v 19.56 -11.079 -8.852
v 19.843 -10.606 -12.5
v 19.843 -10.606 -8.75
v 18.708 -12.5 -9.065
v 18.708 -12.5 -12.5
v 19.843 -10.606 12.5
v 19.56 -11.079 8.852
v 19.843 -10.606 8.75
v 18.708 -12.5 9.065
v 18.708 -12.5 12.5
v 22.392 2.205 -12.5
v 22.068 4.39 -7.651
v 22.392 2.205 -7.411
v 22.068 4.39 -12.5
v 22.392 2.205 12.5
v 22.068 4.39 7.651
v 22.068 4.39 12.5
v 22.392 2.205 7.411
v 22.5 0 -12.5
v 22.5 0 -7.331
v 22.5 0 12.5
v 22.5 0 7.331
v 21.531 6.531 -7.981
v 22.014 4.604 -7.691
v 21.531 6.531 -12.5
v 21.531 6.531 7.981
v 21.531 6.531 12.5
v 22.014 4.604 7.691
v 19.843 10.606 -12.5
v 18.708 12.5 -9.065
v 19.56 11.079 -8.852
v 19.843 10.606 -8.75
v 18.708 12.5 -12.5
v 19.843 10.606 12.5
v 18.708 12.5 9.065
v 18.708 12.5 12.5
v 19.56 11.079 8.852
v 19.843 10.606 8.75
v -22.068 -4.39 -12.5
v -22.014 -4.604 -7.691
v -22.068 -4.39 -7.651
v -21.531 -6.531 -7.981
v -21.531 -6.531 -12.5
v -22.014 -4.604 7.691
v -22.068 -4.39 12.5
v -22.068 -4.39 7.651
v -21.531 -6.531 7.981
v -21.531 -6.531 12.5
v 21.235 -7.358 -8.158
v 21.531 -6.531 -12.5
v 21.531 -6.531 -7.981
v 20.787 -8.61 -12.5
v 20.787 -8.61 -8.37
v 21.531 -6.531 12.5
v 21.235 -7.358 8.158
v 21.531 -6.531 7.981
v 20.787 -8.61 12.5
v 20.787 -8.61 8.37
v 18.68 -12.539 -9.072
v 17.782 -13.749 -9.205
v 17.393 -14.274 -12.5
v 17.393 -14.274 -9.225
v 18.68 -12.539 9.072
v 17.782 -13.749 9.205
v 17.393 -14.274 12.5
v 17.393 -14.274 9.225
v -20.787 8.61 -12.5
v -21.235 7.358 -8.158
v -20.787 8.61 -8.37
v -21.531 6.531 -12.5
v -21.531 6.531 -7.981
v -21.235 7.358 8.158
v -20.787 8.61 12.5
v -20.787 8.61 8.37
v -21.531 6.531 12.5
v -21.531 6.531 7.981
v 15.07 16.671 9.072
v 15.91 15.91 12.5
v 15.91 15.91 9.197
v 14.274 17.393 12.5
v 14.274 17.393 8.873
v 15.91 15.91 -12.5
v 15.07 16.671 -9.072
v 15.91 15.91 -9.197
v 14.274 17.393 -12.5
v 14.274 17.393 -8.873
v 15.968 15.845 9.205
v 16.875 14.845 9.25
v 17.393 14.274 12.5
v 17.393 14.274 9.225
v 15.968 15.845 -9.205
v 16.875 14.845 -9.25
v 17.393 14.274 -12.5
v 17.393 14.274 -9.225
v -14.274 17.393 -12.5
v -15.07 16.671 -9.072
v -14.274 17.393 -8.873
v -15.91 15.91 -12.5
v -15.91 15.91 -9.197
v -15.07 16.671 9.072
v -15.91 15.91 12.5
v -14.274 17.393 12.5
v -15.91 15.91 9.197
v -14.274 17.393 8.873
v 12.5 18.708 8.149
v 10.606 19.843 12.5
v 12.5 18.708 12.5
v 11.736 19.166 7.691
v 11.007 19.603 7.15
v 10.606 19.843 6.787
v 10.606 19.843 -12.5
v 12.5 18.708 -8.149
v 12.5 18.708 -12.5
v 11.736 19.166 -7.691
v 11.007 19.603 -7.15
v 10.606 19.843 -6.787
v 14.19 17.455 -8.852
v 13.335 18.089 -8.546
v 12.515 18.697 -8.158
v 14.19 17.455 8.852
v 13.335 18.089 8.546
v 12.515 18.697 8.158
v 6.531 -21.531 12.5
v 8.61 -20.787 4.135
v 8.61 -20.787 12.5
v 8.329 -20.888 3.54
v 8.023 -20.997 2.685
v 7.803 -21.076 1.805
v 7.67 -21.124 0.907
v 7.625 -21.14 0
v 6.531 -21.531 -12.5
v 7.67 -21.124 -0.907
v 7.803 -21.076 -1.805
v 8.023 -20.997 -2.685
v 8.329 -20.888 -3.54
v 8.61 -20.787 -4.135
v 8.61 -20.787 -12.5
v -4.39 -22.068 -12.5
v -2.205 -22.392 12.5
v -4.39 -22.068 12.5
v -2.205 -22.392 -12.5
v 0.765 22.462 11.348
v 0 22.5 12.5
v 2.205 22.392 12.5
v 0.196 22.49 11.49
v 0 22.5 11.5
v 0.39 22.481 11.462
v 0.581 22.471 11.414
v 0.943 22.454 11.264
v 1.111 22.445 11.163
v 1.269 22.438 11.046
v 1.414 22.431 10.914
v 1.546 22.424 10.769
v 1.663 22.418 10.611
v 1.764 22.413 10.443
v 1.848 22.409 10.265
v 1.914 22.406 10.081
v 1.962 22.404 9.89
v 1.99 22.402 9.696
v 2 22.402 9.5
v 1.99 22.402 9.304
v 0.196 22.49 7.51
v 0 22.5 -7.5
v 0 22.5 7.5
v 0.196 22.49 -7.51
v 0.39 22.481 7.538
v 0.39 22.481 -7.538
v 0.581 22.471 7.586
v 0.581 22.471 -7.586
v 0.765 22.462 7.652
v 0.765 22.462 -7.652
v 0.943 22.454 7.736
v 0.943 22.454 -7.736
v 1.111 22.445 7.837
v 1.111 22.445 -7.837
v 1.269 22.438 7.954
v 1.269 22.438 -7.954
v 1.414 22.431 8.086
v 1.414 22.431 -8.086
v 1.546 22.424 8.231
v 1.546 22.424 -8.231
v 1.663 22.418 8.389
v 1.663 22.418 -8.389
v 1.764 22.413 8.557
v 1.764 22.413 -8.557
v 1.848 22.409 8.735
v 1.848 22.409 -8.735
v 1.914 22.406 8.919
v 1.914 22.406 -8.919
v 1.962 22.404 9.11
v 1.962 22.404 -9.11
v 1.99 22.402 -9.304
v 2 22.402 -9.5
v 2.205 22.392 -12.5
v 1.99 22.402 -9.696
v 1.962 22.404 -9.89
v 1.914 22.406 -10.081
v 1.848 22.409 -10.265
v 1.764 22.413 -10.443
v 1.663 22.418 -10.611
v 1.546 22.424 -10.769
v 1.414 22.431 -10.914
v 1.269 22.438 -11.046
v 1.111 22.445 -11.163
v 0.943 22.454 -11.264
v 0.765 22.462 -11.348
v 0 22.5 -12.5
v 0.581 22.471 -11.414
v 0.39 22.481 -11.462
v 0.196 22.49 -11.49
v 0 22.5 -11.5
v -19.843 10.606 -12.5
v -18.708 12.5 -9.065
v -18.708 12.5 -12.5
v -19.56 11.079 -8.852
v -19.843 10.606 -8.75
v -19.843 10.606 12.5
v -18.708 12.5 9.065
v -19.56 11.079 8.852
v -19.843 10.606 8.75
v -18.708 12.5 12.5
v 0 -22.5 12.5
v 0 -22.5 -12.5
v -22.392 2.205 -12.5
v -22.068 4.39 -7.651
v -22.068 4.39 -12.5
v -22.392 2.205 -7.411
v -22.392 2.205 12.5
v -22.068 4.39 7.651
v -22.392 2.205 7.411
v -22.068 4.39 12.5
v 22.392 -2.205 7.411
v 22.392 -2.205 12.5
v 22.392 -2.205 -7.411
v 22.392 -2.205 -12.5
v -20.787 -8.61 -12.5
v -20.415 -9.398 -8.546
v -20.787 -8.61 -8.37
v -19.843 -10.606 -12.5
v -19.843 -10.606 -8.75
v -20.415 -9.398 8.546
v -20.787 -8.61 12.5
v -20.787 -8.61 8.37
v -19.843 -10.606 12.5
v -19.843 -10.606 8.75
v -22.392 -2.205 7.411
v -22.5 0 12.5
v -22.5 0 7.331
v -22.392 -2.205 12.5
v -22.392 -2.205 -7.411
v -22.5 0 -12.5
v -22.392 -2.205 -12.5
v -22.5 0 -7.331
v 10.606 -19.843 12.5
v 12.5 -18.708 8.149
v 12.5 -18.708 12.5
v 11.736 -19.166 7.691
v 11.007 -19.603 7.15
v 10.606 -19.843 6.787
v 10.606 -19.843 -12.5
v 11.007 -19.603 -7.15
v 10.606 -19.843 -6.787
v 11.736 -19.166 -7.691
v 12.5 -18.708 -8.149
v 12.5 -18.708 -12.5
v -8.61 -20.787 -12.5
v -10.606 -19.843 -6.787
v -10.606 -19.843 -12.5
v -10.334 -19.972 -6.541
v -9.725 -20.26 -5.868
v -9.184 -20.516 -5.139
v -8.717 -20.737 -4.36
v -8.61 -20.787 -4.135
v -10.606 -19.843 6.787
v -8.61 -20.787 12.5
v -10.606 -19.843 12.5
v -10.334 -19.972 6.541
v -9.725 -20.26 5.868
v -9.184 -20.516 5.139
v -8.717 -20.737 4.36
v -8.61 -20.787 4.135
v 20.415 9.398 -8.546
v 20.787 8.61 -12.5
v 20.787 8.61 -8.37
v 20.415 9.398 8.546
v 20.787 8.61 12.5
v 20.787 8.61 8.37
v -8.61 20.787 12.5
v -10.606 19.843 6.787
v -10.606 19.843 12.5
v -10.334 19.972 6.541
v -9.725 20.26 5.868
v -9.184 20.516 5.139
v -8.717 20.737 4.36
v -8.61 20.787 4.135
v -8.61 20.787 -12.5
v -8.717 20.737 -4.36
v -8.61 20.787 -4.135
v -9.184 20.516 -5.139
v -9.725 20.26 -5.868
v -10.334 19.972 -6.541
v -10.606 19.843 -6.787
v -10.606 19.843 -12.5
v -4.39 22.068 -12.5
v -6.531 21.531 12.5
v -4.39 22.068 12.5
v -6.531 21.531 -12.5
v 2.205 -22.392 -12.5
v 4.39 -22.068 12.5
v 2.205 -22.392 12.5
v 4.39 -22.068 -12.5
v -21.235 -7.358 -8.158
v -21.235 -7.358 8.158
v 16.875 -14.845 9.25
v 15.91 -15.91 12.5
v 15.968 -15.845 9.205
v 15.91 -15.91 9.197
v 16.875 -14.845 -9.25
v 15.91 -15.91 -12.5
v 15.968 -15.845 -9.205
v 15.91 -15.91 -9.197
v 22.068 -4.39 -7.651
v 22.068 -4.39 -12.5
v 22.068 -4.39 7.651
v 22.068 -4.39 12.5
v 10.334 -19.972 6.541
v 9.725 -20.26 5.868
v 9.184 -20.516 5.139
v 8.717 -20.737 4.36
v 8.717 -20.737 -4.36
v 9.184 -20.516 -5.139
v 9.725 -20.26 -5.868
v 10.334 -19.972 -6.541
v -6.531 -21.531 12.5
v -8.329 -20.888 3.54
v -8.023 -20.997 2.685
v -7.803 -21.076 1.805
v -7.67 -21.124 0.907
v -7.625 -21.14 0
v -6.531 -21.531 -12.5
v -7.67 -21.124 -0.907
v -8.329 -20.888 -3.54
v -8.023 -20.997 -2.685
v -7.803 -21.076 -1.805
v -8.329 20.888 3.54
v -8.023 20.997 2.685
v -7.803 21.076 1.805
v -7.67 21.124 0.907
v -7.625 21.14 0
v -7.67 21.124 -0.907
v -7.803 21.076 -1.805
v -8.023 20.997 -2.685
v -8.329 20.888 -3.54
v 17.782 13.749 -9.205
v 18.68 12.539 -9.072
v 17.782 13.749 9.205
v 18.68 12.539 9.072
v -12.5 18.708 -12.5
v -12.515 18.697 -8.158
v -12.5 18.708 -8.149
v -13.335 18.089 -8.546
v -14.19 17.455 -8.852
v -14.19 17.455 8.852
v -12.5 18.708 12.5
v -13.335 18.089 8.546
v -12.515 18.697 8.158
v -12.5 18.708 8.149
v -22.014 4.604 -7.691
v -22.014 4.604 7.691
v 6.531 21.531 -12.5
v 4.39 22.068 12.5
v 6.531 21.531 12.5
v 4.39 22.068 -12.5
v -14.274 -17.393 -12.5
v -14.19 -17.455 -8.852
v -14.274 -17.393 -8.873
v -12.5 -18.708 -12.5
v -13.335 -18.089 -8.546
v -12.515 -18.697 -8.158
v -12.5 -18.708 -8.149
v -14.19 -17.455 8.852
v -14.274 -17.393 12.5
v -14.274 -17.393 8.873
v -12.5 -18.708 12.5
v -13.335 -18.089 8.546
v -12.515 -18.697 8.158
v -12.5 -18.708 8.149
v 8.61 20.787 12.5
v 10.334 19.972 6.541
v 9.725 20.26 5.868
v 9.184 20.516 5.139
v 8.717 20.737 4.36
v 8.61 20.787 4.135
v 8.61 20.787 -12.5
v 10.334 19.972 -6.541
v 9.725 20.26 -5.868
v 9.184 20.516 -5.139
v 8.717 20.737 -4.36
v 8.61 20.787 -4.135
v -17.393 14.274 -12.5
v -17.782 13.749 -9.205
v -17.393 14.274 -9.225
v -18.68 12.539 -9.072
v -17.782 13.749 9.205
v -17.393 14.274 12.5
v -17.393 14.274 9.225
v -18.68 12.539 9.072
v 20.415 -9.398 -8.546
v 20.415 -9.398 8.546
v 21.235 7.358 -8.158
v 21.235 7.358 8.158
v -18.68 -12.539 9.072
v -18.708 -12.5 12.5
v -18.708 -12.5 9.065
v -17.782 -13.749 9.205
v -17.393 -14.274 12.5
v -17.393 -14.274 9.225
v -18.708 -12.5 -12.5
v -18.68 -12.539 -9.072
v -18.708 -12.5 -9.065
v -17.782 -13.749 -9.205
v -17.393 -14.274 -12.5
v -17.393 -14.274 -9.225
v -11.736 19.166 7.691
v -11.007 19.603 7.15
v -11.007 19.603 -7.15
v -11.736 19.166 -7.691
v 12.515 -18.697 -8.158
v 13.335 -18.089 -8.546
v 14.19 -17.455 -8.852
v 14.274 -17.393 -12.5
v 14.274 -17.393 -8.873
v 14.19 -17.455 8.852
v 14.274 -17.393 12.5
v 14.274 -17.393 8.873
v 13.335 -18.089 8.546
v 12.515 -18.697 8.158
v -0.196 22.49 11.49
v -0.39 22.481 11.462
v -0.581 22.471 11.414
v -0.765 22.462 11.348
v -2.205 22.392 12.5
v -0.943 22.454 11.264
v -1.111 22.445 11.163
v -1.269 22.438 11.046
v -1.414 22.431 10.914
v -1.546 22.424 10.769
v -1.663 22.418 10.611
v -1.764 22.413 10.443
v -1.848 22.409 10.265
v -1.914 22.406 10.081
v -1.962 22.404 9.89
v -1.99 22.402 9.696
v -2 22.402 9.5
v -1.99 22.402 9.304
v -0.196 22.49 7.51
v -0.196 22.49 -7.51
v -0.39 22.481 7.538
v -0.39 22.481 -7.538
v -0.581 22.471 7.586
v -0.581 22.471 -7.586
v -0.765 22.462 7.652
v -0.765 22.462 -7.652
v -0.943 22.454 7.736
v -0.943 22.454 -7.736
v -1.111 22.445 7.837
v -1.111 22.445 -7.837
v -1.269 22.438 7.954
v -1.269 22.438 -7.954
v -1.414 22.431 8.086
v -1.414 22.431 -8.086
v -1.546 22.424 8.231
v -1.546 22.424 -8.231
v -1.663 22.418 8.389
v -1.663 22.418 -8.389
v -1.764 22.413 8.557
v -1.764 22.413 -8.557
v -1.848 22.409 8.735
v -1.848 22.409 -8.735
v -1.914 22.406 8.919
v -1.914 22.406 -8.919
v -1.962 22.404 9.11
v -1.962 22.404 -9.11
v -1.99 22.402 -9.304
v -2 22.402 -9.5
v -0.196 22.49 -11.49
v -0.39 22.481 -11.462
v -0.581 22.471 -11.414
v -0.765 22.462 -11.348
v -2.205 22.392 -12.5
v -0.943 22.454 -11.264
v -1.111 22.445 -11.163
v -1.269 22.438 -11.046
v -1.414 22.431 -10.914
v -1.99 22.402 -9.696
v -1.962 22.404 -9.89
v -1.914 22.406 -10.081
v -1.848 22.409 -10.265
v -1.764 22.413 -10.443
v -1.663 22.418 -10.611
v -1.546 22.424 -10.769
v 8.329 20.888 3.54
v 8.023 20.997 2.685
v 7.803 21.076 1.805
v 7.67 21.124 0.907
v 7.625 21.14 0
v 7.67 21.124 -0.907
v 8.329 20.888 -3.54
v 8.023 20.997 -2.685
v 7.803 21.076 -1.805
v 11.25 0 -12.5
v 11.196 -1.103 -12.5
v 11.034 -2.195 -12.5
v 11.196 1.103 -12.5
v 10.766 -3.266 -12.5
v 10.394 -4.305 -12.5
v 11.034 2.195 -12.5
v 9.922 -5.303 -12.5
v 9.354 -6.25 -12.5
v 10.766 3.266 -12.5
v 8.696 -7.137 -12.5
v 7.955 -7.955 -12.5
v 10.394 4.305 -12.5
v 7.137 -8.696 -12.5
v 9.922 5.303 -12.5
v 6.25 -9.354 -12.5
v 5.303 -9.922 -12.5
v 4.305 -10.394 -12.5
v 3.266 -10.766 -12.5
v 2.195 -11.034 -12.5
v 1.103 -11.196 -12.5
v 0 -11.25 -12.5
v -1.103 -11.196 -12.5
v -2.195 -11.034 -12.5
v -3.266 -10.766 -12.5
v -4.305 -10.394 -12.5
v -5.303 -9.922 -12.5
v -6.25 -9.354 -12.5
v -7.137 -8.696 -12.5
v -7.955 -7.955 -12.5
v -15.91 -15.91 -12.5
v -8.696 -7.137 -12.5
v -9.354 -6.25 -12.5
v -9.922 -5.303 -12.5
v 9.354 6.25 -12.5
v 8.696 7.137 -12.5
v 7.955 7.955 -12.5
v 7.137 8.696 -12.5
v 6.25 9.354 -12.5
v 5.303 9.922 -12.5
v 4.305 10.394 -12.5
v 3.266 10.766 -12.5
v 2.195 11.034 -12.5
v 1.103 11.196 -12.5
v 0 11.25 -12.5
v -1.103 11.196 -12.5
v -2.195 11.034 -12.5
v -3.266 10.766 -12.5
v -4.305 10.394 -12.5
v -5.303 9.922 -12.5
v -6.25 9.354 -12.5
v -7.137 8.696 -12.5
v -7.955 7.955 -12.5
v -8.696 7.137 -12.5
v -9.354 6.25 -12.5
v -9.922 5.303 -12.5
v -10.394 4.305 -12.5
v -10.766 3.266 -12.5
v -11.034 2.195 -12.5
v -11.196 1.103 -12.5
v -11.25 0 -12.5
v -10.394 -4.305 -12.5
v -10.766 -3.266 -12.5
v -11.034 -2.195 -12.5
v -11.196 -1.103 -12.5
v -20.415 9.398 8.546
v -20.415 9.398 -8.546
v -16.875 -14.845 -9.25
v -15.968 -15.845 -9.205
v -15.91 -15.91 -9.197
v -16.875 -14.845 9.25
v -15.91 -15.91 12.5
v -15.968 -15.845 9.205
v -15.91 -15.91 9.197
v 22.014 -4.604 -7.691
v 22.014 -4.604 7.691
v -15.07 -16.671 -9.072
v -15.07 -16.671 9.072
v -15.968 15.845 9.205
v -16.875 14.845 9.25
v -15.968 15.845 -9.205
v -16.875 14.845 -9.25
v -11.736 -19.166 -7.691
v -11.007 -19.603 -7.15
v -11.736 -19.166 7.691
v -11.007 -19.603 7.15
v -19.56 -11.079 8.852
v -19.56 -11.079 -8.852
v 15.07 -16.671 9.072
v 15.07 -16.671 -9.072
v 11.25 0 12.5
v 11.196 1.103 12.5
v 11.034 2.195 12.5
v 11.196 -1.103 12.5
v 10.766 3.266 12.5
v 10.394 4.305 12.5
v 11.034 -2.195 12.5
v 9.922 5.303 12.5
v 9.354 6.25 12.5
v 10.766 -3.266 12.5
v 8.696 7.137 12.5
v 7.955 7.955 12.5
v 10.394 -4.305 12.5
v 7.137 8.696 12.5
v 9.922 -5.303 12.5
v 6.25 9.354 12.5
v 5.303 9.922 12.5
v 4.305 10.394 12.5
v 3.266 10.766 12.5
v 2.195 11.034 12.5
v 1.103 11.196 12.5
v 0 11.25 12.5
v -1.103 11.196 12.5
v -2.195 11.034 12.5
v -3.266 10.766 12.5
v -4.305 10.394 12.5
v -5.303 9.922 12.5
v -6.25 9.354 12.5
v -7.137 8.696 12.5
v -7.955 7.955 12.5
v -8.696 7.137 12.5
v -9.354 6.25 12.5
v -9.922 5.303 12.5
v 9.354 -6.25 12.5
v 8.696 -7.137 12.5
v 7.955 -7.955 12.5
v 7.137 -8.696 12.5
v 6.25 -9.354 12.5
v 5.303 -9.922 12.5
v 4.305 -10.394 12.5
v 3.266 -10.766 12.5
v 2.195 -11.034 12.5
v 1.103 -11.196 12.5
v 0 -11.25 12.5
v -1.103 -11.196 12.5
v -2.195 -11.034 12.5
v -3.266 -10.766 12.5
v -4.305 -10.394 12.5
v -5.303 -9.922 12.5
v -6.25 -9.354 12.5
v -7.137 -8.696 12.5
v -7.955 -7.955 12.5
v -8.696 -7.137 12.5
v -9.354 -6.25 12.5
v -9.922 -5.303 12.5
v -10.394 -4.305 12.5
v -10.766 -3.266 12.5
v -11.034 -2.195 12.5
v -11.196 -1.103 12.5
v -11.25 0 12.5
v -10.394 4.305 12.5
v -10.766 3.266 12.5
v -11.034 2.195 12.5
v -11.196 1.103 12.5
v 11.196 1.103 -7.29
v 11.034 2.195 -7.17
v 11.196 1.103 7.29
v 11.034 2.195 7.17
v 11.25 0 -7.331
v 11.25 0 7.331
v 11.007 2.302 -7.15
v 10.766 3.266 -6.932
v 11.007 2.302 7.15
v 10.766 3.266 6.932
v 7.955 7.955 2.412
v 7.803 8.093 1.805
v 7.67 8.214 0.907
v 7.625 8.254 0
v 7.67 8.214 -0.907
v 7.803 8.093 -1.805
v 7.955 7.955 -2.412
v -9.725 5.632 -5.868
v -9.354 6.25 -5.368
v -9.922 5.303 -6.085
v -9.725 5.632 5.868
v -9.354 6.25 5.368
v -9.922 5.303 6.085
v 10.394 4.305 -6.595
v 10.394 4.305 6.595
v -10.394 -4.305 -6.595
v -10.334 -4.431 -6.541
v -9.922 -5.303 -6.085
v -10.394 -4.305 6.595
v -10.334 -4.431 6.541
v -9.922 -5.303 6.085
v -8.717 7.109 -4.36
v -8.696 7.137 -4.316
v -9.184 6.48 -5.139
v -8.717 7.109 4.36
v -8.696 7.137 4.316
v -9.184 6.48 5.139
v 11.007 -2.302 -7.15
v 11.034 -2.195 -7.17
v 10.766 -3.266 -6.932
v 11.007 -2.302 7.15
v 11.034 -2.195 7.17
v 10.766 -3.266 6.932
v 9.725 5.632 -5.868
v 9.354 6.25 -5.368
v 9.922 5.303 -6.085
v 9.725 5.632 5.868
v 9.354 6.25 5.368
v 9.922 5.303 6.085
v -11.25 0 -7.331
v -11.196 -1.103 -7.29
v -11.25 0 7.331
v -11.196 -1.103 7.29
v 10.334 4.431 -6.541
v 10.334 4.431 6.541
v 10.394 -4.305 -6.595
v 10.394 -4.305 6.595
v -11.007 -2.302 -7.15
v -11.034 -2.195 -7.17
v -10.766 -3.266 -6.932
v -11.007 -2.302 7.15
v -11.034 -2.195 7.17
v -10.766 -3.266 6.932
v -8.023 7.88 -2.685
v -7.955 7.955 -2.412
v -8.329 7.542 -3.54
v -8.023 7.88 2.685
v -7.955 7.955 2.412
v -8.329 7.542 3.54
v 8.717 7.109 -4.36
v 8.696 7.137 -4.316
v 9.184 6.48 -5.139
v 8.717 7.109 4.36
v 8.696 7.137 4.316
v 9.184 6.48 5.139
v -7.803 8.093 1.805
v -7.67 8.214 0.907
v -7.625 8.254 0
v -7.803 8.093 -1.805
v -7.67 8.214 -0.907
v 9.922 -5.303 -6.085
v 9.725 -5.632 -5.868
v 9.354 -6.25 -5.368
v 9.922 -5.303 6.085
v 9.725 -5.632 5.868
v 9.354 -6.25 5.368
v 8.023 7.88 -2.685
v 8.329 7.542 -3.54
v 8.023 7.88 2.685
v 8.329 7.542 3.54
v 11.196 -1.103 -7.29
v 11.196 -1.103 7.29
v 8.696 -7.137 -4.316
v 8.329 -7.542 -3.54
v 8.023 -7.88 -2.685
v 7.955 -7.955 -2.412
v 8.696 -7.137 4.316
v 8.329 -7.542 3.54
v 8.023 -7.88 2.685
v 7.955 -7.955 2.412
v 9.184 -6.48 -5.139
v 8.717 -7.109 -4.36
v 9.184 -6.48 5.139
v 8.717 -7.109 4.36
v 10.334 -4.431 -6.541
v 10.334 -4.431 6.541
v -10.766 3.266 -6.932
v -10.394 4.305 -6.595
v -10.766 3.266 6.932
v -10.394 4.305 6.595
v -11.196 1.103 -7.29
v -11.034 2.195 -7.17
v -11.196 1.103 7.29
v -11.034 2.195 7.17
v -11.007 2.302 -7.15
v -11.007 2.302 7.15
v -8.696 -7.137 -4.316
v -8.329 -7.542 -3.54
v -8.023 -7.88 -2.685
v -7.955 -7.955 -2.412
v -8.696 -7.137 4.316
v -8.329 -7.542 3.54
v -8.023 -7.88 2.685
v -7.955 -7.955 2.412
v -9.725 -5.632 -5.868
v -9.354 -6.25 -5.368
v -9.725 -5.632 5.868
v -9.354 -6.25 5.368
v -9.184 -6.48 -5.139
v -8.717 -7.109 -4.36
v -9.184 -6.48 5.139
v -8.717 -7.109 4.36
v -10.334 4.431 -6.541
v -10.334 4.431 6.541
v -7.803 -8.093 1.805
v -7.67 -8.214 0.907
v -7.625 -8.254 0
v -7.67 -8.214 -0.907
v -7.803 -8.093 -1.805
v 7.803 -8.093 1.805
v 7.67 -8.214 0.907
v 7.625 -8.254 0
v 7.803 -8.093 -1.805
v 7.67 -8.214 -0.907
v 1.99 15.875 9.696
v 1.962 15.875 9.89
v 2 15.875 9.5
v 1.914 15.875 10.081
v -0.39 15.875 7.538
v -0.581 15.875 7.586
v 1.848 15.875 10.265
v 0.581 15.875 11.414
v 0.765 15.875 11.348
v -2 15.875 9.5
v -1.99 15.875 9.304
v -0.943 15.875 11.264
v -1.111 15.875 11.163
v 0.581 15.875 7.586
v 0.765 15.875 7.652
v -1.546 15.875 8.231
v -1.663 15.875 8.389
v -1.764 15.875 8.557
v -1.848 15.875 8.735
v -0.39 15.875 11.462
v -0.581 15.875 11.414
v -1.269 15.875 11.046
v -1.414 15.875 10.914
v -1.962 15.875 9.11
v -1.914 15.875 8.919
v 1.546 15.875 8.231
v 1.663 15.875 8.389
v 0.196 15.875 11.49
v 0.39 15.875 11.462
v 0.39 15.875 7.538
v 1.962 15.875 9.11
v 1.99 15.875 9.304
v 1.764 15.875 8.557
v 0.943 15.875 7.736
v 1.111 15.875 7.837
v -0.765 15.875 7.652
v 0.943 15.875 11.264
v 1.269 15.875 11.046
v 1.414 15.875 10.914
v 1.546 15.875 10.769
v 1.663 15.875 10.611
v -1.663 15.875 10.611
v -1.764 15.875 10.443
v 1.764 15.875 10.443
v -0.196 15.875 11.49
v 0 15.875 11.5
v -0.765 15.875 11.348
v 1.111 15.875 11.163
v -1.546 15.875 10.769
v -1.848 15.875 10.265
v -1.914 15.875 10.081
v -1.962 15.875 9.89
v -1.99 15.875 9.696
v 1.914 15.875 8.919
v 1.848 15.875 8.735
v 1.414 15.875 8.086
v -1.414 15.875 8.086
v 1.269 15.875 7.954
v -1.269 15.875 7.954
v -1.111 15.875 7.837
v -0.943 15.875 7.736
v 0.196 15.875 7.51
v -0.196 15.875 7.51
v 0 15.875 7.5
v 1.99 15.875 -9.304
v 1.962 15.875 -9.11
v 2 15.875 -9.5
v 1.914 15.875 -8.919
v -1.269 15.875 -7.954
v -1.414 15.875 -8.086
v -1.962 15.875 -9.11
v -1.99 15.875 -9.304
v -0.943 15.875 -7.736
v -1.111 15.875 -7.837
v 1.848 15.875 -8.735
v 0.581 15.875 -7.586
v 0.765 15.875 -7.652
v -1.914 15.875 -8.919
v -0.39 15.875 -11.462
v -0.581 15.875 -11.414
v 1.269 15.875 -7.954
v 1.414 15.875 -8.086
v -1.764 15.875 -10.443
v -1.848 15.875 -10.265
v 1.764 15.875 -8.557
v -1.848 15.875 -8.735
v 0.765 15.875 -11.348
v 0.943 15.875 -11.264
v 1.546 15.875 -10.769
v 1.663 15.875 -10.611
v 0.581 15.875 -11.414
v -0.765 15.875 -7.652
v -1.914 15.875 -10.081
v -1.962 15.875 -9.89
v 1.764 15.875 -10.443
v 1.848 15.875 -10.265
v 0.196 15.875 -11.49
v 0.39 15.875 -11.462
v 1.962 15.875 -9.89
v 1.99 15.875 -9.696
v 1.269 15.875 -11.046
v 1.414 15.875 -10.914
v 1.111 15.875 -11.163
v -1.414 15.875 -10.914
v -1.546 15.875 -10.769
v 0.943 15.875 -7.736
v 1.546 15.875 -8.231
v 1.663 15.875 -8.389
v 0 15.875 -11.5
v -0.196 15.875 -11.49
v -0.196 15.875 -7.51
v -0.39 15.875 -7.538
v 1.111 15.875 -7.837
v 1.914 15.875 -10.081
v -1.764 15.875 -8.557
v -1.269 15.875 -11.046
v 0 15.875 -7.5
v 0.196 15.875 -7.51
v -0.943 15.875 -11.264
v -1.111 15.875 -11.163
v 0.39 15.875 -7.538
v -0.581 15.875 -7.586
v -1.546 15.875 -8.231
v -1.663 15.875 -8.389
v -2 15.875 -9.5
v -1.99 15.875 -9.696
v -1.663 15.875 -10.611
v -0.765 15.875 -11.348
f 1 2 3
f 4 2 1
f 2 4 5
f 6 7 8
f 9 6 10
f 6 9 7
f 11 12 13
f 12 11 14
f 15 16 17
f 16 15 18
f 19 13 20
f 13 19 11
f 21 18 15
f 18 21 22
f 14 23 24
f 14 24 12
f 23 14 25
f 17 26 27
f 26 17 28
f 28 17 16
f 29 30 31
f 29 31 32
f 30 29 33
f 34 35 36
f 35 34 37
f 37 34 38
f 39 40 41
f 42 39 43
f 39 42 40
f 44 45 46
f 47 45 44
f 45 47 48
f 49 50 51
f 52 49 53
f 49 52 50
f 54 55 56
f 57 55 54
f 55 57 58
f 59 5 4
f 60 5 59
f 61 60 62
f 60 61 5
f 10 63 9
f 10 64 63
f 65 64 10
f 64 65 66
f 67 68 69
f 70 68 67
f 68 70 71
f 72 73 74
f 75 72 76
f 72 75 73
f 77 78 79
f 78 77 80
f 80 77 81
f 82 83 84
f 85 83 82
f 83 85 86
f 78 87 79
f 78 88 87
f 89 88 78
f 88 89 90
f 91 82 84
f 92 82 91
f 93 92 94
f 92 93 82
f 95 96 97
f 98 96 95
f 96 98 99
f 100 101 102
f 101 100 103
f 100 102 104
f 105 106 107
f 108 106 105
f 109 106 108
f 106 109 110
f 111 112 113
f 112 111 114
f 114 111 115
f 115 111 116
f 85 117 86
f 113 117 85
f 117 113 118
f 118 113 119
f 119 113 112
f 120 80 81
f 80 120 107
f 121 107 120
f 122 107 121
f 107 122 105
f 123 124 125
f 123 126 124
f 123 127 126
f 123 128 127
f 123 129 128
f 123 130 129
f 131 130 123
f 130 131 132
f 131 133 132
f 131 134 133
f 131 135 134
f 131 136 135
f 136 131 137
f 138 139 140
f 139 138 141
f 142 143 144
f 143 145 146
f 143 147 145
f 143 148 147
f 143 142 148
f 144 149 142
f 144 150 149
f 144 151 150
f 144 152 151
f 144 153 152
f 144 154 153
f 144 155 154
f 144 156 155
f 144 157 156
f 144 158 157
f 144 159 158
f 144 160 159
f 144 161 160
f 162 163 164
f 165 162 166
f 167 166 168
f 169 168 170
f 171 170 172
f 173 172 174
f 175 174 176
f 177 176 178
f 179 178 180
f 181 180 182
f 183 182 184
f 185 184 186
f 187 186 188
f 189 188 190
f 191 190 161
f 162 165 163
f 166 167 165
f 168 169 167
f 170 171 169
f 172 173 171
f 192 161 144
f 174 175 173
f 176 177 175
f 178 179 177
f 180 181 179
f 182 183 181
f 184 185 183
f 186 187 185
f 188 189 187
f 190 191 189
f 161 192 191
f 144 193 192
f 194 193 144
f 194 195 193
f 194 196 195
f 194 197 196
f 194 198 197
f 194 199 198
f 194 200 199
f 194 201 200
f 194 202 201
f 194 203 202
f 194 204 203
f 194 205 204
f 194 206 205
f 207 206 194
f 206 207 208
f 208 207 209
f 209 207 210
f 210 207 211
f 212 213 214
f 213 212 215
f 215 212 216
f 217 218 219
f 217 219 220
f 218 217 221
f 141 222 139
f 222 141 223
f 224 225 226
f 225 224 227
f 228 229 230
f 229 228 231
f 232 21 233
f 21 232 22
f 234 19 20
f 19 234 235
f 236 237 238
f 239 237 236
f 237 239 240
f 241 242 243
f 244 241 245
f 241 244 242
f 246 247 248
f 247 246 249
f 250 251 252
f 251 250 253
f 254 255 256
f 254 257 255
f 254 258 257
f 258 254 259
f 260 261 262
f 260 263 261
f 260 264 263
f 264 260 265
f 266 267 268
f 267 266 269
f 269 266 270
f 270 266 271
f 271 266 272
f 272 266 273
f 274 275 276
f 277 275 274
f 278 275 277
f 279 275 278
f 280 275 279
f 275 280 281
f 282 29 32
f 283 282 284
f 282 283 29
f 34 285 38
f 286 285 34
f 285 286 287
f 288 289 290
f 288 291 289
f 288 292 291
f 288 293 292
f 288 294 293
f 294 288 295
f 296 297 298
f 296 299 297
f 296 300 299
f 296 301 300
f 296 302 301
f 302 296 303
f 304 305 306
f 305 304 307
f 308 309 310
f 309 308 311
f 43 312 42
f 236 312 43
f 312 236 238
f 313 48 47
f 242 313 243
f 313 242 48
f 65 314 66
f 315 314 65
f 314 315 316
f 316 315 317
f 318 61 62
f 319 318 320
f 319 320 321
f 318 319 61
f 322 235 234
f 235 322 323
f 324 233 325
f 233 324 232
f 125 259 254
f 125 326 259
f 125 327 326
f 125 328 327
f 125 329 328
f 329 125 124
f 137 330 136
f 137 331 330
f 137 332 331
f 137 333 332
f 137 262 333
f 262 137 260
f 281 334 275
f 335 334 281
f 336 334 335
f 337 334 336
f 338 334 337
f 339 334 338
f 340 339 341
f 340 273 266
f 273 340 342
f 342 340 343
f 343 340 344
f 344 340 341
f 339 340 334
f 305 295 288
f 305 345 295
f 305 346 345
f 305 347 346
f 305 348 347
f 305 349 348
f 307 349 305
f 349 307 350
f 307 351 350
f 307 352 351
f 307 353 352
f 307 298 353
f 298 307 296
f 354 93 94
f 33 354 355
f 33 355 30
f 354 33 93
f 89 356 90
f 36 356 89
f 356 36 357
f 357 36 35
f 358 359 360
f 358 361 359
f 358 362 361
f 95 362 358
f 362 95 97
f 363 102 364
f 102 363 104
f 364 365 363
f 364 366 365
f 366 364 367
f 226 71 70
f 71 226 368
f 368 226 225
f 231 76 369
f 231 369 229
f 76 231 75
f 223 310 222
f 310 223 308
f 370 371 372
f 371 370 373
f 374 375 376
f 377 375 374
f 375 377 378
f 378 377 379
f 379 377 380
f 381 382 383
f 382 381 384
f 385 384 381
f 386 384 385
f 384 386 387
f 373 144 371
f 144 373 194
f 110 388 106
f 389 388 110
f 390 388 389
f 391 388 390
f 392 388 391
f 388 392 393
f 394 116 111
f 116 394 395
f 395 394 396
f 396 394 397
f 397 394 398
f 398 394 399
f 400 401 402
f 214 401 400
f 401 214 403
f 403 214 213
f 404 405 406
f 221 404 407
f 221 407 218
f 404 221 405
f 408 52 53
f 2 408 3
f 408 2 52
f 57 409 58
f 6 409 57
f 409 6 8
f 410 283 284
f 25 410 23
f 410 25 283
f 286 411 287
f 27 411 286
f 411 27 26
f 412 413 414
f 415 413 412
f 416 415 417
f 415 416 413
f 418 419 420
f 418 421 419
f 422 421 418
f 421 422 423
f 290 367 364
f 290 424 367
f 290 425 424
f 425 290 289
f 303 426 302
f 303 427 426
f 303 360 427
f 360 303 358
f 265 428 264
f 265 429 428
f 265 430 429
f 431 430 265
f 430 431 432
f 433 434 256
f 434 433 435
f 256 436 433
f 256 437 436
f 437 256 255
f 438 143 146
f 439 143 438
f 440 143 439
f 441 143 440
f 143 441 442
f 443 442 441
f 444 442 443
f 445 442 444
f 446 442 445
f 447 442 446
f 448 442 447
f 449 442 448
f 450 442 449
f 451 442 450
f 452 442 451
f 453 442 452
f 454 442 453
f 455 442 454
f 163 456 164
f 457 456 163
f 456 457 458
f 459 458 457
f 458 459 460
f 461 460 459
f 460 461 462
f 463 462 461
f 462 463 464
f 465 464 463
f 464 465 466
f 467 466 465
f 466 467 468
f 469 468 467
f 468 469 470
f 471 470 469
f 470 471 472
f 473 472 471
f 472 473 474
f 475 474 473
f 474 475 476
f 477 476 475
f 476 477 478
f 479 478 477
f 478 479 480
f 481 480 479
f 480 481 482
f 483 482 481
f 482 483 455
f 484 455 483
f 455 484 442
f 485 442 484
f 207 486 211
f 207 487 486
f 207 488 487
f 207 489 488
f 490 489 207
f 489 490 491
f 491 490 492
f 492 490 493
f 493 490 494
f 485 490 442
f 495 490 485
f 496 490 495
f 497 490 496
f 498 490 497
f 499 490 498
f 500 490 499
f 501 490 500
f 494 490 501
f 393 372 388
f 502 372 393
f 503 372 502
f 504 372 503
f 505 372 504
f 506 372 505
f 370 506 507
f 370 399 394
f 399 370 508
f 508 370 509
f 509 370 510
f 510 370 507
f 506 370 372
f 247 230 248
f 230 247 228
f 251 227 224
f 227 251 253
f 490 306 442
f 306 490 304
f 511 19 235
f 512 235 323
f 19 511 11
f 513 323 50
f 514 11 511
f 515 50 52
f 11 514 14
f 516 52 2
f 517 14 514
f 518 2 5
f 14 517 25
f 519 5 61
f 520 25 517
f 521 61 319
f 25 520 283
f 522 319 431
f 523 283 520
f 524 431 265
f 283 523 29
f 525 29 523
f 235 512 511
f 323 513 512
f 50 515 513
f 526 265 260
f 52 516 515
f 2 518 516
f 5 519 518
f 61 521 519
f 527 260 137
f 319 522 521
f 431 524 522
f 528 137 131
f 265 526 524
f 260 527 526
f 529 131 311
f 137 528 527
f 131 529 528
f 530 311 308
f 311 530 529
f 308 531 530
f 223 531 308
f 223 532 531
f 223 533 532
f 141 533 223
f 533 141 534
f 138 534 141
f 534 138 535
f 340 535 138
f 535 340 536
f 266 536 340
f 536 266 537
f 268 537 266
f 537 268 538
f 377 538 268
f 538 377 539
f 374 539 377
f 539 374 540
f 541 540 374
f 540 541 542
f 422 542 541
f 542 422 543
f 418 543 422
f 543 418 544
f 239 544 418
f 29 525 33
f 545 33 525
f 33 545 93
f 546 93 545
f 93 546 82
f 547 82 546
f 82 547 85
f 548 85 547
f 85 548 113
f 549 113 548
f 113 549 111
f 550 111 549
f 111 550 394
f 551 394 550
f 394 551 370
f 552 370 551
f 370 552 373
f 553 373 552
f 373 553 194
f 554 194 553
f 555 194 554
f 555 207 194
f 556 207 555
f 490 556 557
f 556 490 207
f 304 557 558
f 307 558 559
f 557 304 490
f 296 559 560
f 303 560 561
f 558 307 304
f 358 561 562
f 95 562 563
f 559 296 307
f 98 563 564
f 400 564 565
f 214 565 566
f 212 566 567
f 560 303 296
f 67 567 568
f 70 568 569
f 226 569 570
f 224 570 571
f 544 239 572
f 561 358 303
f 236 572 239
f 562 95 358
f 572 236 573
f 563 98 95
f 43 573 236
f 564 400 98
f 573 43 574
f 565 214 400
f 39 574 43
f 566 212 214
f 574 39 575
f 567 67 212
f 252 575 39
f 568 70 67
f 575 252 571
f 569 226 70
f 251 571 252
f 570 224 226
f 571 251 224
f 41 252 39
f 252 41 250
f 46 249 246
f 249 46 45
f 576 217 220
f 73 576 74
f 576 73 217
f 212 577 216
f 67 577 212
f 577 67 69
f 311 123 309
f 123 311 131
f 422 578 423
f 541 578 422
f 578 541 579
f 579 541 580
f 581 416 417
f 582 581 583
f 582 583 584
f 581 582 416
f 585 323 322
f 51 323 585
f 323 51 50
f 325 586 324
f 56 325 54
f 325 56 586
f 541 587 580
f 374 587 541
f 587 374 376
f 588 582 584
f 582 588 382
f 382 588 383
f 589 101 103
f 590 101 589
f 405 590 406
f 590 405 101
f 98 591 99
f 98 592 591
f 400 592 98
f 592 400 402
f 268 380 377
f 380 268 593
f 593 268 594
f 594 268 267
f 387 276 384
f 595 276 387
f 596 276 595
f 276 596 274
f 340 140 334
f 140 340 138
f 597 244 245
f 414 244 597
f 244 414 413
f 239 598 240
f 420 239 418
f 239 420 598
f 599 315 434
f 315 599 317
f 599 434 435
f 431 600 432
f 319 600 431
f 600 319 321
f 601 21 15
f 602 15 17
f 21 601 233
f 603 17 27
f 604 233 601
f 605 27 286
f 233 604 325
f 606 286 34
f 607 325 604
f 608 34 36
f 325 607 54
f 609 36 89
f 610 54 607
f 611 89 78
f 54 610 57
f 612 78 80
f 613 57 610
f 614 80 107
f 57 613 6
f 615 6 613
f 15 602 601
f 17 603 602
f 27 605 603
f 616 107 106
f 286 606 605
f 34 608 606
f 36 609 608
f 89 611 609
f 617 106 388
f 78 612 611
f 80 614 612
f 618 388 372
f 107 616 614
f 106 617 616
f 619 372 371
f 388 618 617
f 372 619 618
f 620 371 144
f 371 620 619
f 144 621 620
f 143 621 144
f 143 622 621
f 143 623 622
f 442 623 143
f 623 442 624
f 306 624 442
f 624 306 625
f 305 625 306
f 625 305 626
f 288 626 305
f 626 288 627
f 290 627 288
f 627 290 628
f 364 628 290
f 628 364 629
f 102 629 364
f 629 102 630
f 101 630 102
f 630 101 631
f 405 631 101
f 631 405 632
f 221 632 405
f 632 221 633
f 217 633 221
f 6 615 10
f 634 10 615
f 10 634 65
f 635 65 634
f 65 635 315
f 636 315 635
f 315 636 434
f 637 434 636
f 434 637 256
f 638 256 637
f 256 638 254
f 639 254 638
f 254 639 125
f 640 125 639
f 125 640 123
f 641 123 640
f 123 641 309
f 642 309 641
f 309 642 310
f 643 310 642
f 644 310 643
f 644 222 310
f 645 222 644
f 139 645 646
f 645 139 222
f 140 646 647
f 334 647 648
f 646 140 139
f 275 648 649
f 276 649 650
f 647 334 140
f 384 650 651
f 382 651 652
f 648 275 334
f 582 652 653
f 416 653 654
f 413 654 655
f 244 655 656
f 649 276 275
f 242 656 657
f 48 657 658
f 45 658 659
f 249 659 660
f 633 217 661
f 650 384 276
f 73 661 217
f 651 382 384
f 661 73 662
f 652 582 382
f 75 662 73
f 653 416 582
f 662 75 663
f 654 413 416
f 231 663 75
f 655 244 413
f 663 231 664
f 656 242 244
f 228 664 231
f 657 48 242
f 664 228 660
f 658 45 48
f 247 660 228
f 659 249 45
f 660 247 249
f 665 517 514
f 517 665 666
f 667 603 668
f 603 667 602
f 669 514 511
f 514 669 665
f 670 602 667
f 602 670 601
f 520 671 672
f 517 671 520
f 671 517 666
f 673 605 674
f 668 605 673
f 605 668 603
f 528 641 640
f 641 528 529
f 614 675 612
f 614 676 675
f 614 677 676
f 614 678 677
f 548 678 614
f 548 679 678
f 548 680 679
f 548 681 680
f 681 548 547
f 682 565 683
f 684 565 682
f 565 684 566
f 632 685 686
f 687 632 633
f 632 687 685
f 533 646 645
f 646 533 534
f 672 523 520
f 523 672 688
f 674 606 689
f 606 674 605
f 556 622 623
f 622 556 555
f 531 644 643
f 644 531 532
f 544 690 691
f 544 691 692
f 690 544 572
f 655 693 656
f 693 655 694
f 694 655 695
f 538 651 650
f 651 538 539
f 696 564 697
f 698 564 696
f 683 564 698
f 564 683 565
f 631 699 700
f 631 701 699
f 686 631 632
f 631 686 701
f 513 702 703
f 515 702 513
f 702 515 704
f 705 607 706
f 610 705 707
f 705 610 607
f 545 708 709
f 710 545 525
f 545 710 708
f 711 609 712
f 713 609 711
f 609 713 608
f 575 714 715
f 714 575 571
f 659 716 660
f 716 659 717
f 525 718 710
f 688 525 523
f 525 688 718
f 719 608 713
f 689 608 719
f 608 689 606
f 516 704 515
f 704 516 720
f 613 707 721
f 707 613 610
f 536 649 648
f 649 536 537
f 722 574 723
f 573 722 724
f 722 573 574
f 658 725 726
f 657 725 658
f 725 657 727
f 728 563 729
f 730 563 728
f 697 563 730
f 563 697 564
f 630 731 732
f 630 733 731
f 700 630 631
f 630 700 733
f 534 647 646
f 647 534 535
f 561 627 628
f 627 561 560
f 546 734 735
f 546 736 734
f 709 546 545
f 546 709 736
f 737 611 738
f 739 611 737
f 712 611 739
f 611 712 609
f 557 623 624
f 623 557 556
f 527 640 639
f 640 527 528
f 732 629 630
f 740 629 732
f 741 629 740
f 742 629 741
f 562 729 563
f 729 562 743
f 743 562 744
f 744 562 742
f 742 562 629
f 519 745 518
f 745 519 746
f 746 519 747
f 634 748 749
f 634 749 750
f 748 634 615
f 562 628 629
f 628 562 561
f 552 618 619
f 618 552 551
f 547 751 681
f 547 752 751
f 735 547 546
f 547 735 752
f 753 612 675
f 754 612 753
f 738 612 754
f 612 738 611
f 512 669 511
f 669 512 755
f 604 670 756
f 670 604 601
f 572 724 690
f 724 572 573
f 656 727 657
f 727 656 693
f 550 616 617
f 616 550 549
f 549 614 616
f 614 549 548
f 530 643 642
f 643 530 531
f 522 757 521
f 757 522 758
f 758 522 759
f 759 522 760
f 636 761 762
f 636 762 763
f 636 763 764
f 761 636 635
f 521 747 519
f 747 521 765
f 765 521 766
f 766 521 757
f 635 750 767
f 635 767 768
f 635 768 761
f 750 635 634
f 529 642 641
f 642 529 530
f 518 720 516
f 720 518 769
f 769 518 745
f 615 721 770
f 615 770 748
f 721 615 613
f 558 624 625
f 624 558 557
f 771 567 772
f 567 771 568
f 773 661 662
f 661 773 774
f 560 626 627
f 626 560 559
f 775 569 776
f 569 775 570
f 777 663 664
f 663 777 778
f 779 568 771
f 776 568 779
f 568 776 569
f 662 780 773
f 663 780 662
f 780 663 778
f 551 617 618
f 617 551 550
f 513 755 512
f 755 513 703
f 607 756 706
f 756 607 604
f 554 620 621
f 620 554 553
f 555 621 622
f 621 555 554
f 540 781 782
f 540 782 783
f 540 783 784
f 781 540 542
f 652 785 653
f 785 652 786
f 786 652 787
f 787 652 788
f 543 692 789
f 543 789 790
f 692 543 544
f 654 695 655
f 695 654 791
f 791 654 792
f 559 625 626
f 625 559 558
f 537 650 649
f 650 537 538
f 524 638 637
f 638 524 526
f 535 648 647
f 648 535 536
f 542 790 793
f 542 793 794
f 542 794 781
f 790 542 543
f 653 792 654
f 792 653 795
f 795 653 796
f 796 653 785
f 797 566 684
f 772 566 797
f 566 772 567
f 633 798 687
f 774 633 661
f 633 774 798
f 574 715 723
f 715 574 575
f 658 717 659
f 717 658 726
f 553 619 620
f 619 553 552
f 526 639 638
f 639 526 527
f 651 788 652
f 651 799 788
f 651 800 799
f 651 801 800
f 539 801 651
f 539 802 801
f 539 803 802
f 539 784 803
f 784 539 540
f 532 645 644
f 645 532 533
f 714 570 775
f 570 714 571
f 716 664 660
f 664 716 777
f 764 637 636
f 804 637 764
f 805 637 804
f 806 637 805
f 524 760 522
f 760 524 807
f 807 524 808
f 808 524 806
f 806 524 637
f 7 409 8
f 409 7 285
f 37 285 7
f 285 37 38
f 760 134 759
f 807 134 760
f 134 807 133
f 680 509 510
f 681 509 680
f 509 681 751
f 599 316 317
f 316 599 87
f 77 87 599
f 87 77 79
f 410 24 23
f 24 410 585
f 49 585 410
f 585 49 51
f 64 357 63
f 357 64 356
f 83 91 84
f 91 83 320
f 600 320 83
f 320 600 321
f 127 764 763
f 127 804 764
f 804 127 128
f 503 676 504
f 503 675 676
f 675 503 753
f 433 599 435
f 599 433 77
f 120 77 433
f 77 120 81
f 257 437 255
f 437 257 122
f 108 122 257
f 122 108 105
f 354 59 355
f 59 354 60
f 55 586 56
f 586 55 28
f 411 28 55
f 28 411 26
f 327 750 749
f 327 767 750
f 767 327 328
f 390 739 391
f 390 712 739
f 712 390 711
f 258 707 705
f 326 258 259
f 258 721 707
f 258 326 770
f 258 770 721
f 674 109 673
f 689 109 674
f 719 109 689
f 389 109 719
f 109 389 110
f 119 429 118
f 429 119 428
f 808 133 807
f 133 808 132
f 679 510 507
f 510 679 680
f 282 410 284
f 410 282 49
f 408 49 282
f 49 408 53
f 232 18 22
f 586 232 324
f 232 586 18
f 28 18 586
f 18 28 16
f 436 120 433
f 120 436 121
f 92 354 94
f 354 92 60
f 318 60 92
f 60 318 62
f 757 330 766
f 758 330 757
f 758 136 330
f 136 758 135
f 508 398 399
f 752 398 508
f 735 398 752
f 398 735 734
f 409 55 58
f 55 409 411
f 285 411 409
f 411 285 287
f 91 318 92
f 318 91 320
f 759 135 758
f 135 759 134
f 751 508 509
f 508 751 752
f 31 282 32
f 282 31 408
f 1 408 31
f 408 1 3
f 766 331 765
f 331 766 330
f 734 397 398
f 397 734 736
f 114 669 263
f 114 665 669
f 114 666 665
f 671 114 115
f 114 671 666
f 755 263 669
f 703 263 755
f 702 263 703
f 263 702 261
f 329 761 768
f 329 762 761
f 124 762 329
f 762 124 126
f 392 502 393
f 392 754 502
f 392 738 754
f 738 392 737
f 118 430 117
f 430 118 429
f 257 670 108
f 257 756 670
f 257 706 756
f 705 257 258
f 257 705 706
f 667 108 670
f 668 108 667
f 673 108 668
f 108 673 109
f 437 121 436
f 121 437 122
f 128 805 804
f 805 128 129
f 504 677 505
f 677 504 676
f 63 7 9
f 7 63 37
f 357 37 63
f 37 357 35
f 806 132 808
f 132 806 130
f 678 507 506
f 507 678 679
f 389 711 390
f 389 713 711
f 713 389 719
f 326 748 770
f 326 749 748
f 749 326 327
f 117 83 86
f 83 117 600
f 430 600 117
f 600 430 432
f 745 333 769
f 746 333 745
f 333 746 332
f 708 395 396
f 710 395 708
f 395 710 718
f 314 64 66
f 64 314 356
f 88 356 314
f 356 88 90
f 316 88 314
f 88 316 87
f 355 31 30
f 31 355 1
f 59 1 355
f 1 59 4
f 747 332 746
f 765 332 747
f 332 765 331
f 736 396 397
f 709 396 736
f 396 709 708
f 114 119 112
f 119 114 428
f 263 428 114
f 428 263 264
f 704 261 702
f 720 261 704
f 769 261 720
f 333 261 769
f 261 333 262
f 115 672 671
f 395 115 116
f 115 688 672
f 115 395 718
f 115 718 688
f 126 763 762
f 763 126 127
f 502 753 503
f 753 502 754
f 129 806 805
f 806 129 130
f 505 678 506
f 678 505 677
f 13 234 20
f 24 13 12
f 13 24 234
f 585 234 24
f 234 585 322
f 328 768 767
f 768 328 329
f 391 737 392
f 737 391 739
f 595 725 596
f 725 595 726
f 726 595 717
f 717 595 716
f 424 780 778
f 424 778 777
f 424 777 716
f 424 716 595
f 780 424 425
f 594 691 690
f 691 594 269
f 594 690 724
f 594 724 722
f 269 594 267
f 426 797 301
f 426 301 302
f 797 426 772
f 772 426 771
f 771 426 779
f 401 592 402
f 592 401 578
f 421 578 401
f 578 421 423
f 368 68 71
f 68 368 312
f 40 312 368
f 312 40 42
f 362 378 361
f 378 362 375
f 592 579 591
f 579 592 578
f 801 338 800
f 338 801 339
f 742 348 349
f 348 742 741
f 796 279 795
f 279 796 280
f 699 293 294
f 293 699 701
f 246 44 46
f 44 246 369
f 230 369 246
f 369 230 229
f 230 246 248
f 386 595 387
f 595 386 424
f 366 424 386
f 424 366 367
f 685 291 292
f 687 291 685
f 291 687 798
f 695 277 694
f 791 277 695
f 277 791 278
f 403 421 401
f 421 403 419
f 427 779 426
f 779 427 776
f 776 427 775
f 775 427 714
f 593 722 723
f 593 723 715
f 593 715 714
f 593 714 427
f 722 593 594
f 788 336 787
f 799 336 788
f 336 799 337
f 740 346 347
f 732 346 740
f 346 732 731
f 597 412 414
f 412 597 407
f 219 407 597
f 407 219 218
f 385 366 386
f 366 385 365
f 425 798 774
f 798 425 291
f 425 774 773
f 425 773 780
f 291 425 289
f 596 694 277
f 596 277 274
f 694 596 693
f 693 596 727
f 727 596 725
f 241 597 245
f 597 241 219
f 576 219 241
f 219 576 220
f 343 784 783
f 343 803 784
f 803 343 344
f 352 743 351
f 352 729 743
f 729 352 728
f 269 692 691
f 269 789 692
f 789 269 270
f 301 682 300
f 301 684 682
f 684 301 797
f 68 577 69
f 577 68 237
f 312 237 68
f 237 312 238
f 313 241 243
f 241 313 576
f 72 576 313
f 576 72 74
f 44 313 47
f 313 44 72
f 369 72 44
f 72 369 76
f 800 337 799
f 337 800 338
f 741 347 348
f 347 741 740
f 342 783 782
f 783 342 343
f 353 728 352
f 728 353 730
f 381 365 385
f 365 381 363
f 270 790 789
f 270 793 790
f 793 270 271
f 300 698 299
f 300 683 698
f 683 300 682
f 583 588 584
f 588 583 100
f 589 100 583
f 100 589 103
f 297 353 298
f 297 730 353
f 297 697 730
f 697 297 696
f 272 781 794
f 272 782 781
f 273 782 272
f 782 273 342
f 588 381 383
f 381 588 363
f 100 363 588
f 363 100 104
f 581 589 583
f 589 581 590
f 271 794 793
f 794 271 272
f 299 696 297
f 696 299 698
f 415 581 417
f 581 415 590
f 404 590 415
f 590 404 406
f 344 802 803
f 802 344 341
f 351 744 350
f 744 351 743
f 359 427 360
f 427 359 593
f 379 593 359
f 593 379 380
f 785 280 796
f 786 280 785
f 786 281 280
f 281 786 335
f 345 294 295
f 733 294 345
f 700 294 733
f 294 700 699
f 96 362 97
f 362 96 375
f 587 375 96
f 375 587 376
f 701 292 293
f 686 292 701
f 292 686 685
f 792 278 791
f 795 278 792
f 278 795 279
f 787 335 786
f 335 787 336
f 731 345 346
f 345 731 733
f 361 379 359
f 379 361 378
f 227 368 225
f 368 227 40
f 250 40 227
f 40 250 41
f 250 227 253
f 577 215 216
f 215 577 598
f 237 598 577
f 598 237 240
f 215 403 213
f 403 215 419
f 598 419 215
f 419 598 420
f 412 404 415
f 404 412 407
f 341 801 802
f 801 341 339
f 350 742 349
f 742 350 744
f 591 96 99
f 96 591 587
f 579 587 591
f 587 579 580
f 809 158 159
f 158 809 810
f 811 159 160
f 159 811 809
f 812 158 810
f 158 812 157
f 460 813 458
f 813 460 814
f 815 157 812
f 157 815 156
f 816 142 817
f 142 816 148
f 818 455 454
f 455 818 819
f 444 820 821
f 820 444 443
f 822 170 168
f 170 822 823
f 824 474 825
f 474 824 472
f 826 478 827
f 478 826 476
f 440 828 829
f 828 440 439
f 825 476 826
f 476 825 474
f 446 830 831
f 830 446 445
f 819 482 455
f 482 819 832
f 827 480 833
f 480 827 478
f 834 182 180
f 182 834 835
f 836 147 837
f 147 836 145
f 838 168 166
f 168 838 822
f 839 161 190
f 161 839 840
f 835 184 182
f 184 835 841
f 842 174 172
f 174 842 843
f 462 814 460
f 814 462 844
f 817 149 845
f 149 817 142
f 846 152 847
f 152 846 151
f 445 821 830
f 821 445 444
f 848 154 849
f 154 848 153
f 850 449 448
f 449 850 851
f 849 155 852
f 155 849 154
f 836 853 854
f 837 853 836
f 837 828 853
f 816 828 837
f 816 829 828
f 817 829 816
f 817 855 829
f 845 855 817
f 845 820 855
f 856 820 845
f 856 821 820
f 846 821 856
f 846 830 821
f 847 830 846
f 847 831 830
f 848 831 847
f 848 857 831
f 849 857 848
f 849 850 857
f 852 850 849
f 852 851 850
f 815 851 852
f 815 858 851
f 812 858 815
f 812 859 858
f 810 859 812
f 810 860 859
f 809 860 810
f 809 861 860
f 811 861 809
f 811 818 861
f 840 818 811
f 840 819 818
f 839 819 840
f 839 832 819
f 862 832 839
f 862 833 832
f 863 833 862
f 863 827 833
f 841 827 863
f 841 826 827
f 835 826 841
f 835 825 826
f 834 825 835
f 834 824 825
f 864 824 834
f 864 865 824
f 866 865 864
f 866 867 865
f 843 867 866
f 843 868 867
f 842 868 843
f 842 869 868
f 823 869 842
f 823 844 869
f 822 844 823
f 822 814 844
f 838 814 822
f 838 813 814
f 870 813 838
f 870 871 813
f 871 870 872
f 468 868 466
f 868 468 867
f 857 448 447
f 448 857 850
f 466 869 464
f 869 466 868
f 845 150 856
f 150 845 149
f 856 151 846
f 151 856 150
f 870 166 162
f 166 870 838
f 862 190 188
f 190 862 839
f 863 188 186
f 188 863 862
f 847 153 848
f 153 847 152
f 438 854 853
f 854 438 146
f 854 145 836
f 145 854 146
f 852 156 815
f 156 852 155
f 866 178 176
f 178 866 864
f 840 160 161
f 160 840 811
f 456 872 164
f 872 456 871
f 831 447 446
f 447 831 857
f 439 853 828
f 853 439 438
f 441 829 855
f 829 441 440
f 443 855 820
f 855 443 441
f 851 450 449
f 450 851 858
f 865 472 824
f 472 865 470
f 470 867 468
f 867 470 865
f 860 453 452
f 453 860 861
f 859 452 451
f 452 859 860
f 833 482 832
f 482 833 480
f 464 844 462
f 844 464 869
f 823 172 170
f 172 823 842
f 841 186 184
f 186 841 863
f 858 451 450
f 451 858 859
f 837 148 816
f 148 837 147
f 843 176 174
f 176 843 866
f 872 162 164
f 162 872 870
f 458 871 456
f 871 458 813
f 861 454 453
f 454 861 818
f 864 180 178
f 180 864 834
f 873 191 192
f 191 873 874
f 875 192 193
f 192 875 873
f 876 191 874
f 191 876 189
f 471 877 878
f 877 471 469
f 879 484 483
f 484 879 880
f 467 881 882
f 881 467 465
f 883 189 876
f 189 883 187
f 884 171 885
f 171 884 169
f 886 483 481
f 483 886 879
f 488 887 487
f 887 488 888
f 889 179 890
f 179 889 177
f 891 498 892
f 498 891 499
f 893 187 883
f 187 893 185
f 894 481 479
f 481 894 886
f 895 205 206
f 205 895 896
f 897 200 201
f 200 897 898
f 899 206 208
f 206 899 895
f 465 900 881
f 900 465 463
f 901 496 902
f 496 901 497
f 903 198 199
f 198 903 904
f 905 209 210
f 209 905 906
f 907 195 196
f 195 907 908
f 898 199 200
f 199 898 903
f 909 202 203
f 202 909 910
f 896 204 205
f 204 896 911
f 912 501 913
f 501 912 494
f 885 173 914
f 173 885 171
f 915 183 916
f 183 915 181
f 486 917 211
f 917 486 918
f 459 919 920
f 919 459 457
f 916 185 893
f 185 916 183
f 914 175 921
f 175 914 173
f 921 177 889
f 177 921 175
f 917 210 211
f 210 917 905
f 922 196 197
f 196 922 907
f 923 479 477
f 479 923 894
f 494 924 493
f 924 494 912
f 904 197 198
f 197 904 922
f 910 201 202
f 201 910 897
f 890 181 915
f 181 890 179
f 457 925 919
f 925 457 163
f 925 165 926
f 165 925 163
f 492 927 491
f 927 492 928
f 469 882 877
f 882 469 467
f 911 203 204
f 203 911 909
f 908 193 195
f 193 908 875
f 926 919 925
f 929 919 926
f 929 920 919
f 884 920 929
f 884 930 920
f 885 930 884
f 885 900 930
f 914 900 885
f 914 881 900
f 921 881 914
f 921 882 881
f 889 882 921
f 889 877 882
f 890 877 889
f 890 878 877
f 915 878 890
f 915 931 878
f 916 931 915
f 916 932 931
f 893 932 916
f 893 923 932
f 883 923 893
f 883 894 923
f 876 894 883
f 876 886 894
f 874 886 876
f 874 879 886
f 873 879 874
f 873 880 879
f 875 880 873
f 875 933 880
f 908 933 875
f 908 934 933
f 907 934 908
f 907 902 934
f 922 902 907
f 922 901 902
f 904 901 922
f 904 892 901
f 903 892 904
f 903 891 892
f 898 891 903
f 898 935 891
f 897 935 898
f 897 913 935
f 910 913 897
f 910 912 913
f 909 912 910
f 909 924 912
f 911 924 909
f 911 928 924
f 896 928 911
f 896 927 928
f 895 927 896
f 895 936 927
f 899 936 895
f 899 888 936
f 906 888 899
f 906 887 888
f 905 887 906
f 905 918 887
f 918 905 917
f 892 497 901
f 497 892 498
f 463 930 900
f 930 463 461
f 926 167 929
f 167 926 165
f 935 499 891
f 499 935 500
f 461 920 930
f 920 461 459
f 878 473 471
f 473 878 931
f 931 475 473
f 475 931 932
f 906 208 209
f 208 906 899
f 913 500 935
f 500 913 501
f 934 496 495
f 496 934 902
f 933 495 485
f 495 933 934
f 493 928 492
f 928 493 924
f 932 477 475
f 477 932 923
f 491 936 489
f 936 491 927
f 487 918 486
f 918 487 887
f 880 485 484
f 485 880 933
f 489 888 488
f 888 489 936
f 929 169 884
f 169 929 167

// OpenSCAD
// COBRA Vertebra - L4 V22
// Height: 25.0mm, OD: 45.0mm

$fn = 64;

difference() {
    // Outer cylinder
    cylinder(h=25.0, d=45.0, center=true);
    
    // Inner channel
    cylinder(h=27.0, d=22.5, center=true);

    // Battery cavity 1
    rotate([0, 0, 0])
    translate([16.875, 0, 0])
    rotate([90, 0, 0])
    cylinder(h=74.0, d=18.5, center=true);

    // Battery cavity 2
    rotate([0, 0, 180])
    translate([16.875, 0, 0])
    rotate([90, 0, 0])
    cylinder(h=74.0, d=18.5, center=true);

    // Pivot holes
    translate([0, 22.5, 9.5])
    rotate([90, 0, 0])
    cylinder(h=13.25, d=4, center=true);
    
    translate([0, 22.5, -9.5])
    rotate([90, 0, 0])
    cylinder(h=13.25, d=4, center=true);
}
